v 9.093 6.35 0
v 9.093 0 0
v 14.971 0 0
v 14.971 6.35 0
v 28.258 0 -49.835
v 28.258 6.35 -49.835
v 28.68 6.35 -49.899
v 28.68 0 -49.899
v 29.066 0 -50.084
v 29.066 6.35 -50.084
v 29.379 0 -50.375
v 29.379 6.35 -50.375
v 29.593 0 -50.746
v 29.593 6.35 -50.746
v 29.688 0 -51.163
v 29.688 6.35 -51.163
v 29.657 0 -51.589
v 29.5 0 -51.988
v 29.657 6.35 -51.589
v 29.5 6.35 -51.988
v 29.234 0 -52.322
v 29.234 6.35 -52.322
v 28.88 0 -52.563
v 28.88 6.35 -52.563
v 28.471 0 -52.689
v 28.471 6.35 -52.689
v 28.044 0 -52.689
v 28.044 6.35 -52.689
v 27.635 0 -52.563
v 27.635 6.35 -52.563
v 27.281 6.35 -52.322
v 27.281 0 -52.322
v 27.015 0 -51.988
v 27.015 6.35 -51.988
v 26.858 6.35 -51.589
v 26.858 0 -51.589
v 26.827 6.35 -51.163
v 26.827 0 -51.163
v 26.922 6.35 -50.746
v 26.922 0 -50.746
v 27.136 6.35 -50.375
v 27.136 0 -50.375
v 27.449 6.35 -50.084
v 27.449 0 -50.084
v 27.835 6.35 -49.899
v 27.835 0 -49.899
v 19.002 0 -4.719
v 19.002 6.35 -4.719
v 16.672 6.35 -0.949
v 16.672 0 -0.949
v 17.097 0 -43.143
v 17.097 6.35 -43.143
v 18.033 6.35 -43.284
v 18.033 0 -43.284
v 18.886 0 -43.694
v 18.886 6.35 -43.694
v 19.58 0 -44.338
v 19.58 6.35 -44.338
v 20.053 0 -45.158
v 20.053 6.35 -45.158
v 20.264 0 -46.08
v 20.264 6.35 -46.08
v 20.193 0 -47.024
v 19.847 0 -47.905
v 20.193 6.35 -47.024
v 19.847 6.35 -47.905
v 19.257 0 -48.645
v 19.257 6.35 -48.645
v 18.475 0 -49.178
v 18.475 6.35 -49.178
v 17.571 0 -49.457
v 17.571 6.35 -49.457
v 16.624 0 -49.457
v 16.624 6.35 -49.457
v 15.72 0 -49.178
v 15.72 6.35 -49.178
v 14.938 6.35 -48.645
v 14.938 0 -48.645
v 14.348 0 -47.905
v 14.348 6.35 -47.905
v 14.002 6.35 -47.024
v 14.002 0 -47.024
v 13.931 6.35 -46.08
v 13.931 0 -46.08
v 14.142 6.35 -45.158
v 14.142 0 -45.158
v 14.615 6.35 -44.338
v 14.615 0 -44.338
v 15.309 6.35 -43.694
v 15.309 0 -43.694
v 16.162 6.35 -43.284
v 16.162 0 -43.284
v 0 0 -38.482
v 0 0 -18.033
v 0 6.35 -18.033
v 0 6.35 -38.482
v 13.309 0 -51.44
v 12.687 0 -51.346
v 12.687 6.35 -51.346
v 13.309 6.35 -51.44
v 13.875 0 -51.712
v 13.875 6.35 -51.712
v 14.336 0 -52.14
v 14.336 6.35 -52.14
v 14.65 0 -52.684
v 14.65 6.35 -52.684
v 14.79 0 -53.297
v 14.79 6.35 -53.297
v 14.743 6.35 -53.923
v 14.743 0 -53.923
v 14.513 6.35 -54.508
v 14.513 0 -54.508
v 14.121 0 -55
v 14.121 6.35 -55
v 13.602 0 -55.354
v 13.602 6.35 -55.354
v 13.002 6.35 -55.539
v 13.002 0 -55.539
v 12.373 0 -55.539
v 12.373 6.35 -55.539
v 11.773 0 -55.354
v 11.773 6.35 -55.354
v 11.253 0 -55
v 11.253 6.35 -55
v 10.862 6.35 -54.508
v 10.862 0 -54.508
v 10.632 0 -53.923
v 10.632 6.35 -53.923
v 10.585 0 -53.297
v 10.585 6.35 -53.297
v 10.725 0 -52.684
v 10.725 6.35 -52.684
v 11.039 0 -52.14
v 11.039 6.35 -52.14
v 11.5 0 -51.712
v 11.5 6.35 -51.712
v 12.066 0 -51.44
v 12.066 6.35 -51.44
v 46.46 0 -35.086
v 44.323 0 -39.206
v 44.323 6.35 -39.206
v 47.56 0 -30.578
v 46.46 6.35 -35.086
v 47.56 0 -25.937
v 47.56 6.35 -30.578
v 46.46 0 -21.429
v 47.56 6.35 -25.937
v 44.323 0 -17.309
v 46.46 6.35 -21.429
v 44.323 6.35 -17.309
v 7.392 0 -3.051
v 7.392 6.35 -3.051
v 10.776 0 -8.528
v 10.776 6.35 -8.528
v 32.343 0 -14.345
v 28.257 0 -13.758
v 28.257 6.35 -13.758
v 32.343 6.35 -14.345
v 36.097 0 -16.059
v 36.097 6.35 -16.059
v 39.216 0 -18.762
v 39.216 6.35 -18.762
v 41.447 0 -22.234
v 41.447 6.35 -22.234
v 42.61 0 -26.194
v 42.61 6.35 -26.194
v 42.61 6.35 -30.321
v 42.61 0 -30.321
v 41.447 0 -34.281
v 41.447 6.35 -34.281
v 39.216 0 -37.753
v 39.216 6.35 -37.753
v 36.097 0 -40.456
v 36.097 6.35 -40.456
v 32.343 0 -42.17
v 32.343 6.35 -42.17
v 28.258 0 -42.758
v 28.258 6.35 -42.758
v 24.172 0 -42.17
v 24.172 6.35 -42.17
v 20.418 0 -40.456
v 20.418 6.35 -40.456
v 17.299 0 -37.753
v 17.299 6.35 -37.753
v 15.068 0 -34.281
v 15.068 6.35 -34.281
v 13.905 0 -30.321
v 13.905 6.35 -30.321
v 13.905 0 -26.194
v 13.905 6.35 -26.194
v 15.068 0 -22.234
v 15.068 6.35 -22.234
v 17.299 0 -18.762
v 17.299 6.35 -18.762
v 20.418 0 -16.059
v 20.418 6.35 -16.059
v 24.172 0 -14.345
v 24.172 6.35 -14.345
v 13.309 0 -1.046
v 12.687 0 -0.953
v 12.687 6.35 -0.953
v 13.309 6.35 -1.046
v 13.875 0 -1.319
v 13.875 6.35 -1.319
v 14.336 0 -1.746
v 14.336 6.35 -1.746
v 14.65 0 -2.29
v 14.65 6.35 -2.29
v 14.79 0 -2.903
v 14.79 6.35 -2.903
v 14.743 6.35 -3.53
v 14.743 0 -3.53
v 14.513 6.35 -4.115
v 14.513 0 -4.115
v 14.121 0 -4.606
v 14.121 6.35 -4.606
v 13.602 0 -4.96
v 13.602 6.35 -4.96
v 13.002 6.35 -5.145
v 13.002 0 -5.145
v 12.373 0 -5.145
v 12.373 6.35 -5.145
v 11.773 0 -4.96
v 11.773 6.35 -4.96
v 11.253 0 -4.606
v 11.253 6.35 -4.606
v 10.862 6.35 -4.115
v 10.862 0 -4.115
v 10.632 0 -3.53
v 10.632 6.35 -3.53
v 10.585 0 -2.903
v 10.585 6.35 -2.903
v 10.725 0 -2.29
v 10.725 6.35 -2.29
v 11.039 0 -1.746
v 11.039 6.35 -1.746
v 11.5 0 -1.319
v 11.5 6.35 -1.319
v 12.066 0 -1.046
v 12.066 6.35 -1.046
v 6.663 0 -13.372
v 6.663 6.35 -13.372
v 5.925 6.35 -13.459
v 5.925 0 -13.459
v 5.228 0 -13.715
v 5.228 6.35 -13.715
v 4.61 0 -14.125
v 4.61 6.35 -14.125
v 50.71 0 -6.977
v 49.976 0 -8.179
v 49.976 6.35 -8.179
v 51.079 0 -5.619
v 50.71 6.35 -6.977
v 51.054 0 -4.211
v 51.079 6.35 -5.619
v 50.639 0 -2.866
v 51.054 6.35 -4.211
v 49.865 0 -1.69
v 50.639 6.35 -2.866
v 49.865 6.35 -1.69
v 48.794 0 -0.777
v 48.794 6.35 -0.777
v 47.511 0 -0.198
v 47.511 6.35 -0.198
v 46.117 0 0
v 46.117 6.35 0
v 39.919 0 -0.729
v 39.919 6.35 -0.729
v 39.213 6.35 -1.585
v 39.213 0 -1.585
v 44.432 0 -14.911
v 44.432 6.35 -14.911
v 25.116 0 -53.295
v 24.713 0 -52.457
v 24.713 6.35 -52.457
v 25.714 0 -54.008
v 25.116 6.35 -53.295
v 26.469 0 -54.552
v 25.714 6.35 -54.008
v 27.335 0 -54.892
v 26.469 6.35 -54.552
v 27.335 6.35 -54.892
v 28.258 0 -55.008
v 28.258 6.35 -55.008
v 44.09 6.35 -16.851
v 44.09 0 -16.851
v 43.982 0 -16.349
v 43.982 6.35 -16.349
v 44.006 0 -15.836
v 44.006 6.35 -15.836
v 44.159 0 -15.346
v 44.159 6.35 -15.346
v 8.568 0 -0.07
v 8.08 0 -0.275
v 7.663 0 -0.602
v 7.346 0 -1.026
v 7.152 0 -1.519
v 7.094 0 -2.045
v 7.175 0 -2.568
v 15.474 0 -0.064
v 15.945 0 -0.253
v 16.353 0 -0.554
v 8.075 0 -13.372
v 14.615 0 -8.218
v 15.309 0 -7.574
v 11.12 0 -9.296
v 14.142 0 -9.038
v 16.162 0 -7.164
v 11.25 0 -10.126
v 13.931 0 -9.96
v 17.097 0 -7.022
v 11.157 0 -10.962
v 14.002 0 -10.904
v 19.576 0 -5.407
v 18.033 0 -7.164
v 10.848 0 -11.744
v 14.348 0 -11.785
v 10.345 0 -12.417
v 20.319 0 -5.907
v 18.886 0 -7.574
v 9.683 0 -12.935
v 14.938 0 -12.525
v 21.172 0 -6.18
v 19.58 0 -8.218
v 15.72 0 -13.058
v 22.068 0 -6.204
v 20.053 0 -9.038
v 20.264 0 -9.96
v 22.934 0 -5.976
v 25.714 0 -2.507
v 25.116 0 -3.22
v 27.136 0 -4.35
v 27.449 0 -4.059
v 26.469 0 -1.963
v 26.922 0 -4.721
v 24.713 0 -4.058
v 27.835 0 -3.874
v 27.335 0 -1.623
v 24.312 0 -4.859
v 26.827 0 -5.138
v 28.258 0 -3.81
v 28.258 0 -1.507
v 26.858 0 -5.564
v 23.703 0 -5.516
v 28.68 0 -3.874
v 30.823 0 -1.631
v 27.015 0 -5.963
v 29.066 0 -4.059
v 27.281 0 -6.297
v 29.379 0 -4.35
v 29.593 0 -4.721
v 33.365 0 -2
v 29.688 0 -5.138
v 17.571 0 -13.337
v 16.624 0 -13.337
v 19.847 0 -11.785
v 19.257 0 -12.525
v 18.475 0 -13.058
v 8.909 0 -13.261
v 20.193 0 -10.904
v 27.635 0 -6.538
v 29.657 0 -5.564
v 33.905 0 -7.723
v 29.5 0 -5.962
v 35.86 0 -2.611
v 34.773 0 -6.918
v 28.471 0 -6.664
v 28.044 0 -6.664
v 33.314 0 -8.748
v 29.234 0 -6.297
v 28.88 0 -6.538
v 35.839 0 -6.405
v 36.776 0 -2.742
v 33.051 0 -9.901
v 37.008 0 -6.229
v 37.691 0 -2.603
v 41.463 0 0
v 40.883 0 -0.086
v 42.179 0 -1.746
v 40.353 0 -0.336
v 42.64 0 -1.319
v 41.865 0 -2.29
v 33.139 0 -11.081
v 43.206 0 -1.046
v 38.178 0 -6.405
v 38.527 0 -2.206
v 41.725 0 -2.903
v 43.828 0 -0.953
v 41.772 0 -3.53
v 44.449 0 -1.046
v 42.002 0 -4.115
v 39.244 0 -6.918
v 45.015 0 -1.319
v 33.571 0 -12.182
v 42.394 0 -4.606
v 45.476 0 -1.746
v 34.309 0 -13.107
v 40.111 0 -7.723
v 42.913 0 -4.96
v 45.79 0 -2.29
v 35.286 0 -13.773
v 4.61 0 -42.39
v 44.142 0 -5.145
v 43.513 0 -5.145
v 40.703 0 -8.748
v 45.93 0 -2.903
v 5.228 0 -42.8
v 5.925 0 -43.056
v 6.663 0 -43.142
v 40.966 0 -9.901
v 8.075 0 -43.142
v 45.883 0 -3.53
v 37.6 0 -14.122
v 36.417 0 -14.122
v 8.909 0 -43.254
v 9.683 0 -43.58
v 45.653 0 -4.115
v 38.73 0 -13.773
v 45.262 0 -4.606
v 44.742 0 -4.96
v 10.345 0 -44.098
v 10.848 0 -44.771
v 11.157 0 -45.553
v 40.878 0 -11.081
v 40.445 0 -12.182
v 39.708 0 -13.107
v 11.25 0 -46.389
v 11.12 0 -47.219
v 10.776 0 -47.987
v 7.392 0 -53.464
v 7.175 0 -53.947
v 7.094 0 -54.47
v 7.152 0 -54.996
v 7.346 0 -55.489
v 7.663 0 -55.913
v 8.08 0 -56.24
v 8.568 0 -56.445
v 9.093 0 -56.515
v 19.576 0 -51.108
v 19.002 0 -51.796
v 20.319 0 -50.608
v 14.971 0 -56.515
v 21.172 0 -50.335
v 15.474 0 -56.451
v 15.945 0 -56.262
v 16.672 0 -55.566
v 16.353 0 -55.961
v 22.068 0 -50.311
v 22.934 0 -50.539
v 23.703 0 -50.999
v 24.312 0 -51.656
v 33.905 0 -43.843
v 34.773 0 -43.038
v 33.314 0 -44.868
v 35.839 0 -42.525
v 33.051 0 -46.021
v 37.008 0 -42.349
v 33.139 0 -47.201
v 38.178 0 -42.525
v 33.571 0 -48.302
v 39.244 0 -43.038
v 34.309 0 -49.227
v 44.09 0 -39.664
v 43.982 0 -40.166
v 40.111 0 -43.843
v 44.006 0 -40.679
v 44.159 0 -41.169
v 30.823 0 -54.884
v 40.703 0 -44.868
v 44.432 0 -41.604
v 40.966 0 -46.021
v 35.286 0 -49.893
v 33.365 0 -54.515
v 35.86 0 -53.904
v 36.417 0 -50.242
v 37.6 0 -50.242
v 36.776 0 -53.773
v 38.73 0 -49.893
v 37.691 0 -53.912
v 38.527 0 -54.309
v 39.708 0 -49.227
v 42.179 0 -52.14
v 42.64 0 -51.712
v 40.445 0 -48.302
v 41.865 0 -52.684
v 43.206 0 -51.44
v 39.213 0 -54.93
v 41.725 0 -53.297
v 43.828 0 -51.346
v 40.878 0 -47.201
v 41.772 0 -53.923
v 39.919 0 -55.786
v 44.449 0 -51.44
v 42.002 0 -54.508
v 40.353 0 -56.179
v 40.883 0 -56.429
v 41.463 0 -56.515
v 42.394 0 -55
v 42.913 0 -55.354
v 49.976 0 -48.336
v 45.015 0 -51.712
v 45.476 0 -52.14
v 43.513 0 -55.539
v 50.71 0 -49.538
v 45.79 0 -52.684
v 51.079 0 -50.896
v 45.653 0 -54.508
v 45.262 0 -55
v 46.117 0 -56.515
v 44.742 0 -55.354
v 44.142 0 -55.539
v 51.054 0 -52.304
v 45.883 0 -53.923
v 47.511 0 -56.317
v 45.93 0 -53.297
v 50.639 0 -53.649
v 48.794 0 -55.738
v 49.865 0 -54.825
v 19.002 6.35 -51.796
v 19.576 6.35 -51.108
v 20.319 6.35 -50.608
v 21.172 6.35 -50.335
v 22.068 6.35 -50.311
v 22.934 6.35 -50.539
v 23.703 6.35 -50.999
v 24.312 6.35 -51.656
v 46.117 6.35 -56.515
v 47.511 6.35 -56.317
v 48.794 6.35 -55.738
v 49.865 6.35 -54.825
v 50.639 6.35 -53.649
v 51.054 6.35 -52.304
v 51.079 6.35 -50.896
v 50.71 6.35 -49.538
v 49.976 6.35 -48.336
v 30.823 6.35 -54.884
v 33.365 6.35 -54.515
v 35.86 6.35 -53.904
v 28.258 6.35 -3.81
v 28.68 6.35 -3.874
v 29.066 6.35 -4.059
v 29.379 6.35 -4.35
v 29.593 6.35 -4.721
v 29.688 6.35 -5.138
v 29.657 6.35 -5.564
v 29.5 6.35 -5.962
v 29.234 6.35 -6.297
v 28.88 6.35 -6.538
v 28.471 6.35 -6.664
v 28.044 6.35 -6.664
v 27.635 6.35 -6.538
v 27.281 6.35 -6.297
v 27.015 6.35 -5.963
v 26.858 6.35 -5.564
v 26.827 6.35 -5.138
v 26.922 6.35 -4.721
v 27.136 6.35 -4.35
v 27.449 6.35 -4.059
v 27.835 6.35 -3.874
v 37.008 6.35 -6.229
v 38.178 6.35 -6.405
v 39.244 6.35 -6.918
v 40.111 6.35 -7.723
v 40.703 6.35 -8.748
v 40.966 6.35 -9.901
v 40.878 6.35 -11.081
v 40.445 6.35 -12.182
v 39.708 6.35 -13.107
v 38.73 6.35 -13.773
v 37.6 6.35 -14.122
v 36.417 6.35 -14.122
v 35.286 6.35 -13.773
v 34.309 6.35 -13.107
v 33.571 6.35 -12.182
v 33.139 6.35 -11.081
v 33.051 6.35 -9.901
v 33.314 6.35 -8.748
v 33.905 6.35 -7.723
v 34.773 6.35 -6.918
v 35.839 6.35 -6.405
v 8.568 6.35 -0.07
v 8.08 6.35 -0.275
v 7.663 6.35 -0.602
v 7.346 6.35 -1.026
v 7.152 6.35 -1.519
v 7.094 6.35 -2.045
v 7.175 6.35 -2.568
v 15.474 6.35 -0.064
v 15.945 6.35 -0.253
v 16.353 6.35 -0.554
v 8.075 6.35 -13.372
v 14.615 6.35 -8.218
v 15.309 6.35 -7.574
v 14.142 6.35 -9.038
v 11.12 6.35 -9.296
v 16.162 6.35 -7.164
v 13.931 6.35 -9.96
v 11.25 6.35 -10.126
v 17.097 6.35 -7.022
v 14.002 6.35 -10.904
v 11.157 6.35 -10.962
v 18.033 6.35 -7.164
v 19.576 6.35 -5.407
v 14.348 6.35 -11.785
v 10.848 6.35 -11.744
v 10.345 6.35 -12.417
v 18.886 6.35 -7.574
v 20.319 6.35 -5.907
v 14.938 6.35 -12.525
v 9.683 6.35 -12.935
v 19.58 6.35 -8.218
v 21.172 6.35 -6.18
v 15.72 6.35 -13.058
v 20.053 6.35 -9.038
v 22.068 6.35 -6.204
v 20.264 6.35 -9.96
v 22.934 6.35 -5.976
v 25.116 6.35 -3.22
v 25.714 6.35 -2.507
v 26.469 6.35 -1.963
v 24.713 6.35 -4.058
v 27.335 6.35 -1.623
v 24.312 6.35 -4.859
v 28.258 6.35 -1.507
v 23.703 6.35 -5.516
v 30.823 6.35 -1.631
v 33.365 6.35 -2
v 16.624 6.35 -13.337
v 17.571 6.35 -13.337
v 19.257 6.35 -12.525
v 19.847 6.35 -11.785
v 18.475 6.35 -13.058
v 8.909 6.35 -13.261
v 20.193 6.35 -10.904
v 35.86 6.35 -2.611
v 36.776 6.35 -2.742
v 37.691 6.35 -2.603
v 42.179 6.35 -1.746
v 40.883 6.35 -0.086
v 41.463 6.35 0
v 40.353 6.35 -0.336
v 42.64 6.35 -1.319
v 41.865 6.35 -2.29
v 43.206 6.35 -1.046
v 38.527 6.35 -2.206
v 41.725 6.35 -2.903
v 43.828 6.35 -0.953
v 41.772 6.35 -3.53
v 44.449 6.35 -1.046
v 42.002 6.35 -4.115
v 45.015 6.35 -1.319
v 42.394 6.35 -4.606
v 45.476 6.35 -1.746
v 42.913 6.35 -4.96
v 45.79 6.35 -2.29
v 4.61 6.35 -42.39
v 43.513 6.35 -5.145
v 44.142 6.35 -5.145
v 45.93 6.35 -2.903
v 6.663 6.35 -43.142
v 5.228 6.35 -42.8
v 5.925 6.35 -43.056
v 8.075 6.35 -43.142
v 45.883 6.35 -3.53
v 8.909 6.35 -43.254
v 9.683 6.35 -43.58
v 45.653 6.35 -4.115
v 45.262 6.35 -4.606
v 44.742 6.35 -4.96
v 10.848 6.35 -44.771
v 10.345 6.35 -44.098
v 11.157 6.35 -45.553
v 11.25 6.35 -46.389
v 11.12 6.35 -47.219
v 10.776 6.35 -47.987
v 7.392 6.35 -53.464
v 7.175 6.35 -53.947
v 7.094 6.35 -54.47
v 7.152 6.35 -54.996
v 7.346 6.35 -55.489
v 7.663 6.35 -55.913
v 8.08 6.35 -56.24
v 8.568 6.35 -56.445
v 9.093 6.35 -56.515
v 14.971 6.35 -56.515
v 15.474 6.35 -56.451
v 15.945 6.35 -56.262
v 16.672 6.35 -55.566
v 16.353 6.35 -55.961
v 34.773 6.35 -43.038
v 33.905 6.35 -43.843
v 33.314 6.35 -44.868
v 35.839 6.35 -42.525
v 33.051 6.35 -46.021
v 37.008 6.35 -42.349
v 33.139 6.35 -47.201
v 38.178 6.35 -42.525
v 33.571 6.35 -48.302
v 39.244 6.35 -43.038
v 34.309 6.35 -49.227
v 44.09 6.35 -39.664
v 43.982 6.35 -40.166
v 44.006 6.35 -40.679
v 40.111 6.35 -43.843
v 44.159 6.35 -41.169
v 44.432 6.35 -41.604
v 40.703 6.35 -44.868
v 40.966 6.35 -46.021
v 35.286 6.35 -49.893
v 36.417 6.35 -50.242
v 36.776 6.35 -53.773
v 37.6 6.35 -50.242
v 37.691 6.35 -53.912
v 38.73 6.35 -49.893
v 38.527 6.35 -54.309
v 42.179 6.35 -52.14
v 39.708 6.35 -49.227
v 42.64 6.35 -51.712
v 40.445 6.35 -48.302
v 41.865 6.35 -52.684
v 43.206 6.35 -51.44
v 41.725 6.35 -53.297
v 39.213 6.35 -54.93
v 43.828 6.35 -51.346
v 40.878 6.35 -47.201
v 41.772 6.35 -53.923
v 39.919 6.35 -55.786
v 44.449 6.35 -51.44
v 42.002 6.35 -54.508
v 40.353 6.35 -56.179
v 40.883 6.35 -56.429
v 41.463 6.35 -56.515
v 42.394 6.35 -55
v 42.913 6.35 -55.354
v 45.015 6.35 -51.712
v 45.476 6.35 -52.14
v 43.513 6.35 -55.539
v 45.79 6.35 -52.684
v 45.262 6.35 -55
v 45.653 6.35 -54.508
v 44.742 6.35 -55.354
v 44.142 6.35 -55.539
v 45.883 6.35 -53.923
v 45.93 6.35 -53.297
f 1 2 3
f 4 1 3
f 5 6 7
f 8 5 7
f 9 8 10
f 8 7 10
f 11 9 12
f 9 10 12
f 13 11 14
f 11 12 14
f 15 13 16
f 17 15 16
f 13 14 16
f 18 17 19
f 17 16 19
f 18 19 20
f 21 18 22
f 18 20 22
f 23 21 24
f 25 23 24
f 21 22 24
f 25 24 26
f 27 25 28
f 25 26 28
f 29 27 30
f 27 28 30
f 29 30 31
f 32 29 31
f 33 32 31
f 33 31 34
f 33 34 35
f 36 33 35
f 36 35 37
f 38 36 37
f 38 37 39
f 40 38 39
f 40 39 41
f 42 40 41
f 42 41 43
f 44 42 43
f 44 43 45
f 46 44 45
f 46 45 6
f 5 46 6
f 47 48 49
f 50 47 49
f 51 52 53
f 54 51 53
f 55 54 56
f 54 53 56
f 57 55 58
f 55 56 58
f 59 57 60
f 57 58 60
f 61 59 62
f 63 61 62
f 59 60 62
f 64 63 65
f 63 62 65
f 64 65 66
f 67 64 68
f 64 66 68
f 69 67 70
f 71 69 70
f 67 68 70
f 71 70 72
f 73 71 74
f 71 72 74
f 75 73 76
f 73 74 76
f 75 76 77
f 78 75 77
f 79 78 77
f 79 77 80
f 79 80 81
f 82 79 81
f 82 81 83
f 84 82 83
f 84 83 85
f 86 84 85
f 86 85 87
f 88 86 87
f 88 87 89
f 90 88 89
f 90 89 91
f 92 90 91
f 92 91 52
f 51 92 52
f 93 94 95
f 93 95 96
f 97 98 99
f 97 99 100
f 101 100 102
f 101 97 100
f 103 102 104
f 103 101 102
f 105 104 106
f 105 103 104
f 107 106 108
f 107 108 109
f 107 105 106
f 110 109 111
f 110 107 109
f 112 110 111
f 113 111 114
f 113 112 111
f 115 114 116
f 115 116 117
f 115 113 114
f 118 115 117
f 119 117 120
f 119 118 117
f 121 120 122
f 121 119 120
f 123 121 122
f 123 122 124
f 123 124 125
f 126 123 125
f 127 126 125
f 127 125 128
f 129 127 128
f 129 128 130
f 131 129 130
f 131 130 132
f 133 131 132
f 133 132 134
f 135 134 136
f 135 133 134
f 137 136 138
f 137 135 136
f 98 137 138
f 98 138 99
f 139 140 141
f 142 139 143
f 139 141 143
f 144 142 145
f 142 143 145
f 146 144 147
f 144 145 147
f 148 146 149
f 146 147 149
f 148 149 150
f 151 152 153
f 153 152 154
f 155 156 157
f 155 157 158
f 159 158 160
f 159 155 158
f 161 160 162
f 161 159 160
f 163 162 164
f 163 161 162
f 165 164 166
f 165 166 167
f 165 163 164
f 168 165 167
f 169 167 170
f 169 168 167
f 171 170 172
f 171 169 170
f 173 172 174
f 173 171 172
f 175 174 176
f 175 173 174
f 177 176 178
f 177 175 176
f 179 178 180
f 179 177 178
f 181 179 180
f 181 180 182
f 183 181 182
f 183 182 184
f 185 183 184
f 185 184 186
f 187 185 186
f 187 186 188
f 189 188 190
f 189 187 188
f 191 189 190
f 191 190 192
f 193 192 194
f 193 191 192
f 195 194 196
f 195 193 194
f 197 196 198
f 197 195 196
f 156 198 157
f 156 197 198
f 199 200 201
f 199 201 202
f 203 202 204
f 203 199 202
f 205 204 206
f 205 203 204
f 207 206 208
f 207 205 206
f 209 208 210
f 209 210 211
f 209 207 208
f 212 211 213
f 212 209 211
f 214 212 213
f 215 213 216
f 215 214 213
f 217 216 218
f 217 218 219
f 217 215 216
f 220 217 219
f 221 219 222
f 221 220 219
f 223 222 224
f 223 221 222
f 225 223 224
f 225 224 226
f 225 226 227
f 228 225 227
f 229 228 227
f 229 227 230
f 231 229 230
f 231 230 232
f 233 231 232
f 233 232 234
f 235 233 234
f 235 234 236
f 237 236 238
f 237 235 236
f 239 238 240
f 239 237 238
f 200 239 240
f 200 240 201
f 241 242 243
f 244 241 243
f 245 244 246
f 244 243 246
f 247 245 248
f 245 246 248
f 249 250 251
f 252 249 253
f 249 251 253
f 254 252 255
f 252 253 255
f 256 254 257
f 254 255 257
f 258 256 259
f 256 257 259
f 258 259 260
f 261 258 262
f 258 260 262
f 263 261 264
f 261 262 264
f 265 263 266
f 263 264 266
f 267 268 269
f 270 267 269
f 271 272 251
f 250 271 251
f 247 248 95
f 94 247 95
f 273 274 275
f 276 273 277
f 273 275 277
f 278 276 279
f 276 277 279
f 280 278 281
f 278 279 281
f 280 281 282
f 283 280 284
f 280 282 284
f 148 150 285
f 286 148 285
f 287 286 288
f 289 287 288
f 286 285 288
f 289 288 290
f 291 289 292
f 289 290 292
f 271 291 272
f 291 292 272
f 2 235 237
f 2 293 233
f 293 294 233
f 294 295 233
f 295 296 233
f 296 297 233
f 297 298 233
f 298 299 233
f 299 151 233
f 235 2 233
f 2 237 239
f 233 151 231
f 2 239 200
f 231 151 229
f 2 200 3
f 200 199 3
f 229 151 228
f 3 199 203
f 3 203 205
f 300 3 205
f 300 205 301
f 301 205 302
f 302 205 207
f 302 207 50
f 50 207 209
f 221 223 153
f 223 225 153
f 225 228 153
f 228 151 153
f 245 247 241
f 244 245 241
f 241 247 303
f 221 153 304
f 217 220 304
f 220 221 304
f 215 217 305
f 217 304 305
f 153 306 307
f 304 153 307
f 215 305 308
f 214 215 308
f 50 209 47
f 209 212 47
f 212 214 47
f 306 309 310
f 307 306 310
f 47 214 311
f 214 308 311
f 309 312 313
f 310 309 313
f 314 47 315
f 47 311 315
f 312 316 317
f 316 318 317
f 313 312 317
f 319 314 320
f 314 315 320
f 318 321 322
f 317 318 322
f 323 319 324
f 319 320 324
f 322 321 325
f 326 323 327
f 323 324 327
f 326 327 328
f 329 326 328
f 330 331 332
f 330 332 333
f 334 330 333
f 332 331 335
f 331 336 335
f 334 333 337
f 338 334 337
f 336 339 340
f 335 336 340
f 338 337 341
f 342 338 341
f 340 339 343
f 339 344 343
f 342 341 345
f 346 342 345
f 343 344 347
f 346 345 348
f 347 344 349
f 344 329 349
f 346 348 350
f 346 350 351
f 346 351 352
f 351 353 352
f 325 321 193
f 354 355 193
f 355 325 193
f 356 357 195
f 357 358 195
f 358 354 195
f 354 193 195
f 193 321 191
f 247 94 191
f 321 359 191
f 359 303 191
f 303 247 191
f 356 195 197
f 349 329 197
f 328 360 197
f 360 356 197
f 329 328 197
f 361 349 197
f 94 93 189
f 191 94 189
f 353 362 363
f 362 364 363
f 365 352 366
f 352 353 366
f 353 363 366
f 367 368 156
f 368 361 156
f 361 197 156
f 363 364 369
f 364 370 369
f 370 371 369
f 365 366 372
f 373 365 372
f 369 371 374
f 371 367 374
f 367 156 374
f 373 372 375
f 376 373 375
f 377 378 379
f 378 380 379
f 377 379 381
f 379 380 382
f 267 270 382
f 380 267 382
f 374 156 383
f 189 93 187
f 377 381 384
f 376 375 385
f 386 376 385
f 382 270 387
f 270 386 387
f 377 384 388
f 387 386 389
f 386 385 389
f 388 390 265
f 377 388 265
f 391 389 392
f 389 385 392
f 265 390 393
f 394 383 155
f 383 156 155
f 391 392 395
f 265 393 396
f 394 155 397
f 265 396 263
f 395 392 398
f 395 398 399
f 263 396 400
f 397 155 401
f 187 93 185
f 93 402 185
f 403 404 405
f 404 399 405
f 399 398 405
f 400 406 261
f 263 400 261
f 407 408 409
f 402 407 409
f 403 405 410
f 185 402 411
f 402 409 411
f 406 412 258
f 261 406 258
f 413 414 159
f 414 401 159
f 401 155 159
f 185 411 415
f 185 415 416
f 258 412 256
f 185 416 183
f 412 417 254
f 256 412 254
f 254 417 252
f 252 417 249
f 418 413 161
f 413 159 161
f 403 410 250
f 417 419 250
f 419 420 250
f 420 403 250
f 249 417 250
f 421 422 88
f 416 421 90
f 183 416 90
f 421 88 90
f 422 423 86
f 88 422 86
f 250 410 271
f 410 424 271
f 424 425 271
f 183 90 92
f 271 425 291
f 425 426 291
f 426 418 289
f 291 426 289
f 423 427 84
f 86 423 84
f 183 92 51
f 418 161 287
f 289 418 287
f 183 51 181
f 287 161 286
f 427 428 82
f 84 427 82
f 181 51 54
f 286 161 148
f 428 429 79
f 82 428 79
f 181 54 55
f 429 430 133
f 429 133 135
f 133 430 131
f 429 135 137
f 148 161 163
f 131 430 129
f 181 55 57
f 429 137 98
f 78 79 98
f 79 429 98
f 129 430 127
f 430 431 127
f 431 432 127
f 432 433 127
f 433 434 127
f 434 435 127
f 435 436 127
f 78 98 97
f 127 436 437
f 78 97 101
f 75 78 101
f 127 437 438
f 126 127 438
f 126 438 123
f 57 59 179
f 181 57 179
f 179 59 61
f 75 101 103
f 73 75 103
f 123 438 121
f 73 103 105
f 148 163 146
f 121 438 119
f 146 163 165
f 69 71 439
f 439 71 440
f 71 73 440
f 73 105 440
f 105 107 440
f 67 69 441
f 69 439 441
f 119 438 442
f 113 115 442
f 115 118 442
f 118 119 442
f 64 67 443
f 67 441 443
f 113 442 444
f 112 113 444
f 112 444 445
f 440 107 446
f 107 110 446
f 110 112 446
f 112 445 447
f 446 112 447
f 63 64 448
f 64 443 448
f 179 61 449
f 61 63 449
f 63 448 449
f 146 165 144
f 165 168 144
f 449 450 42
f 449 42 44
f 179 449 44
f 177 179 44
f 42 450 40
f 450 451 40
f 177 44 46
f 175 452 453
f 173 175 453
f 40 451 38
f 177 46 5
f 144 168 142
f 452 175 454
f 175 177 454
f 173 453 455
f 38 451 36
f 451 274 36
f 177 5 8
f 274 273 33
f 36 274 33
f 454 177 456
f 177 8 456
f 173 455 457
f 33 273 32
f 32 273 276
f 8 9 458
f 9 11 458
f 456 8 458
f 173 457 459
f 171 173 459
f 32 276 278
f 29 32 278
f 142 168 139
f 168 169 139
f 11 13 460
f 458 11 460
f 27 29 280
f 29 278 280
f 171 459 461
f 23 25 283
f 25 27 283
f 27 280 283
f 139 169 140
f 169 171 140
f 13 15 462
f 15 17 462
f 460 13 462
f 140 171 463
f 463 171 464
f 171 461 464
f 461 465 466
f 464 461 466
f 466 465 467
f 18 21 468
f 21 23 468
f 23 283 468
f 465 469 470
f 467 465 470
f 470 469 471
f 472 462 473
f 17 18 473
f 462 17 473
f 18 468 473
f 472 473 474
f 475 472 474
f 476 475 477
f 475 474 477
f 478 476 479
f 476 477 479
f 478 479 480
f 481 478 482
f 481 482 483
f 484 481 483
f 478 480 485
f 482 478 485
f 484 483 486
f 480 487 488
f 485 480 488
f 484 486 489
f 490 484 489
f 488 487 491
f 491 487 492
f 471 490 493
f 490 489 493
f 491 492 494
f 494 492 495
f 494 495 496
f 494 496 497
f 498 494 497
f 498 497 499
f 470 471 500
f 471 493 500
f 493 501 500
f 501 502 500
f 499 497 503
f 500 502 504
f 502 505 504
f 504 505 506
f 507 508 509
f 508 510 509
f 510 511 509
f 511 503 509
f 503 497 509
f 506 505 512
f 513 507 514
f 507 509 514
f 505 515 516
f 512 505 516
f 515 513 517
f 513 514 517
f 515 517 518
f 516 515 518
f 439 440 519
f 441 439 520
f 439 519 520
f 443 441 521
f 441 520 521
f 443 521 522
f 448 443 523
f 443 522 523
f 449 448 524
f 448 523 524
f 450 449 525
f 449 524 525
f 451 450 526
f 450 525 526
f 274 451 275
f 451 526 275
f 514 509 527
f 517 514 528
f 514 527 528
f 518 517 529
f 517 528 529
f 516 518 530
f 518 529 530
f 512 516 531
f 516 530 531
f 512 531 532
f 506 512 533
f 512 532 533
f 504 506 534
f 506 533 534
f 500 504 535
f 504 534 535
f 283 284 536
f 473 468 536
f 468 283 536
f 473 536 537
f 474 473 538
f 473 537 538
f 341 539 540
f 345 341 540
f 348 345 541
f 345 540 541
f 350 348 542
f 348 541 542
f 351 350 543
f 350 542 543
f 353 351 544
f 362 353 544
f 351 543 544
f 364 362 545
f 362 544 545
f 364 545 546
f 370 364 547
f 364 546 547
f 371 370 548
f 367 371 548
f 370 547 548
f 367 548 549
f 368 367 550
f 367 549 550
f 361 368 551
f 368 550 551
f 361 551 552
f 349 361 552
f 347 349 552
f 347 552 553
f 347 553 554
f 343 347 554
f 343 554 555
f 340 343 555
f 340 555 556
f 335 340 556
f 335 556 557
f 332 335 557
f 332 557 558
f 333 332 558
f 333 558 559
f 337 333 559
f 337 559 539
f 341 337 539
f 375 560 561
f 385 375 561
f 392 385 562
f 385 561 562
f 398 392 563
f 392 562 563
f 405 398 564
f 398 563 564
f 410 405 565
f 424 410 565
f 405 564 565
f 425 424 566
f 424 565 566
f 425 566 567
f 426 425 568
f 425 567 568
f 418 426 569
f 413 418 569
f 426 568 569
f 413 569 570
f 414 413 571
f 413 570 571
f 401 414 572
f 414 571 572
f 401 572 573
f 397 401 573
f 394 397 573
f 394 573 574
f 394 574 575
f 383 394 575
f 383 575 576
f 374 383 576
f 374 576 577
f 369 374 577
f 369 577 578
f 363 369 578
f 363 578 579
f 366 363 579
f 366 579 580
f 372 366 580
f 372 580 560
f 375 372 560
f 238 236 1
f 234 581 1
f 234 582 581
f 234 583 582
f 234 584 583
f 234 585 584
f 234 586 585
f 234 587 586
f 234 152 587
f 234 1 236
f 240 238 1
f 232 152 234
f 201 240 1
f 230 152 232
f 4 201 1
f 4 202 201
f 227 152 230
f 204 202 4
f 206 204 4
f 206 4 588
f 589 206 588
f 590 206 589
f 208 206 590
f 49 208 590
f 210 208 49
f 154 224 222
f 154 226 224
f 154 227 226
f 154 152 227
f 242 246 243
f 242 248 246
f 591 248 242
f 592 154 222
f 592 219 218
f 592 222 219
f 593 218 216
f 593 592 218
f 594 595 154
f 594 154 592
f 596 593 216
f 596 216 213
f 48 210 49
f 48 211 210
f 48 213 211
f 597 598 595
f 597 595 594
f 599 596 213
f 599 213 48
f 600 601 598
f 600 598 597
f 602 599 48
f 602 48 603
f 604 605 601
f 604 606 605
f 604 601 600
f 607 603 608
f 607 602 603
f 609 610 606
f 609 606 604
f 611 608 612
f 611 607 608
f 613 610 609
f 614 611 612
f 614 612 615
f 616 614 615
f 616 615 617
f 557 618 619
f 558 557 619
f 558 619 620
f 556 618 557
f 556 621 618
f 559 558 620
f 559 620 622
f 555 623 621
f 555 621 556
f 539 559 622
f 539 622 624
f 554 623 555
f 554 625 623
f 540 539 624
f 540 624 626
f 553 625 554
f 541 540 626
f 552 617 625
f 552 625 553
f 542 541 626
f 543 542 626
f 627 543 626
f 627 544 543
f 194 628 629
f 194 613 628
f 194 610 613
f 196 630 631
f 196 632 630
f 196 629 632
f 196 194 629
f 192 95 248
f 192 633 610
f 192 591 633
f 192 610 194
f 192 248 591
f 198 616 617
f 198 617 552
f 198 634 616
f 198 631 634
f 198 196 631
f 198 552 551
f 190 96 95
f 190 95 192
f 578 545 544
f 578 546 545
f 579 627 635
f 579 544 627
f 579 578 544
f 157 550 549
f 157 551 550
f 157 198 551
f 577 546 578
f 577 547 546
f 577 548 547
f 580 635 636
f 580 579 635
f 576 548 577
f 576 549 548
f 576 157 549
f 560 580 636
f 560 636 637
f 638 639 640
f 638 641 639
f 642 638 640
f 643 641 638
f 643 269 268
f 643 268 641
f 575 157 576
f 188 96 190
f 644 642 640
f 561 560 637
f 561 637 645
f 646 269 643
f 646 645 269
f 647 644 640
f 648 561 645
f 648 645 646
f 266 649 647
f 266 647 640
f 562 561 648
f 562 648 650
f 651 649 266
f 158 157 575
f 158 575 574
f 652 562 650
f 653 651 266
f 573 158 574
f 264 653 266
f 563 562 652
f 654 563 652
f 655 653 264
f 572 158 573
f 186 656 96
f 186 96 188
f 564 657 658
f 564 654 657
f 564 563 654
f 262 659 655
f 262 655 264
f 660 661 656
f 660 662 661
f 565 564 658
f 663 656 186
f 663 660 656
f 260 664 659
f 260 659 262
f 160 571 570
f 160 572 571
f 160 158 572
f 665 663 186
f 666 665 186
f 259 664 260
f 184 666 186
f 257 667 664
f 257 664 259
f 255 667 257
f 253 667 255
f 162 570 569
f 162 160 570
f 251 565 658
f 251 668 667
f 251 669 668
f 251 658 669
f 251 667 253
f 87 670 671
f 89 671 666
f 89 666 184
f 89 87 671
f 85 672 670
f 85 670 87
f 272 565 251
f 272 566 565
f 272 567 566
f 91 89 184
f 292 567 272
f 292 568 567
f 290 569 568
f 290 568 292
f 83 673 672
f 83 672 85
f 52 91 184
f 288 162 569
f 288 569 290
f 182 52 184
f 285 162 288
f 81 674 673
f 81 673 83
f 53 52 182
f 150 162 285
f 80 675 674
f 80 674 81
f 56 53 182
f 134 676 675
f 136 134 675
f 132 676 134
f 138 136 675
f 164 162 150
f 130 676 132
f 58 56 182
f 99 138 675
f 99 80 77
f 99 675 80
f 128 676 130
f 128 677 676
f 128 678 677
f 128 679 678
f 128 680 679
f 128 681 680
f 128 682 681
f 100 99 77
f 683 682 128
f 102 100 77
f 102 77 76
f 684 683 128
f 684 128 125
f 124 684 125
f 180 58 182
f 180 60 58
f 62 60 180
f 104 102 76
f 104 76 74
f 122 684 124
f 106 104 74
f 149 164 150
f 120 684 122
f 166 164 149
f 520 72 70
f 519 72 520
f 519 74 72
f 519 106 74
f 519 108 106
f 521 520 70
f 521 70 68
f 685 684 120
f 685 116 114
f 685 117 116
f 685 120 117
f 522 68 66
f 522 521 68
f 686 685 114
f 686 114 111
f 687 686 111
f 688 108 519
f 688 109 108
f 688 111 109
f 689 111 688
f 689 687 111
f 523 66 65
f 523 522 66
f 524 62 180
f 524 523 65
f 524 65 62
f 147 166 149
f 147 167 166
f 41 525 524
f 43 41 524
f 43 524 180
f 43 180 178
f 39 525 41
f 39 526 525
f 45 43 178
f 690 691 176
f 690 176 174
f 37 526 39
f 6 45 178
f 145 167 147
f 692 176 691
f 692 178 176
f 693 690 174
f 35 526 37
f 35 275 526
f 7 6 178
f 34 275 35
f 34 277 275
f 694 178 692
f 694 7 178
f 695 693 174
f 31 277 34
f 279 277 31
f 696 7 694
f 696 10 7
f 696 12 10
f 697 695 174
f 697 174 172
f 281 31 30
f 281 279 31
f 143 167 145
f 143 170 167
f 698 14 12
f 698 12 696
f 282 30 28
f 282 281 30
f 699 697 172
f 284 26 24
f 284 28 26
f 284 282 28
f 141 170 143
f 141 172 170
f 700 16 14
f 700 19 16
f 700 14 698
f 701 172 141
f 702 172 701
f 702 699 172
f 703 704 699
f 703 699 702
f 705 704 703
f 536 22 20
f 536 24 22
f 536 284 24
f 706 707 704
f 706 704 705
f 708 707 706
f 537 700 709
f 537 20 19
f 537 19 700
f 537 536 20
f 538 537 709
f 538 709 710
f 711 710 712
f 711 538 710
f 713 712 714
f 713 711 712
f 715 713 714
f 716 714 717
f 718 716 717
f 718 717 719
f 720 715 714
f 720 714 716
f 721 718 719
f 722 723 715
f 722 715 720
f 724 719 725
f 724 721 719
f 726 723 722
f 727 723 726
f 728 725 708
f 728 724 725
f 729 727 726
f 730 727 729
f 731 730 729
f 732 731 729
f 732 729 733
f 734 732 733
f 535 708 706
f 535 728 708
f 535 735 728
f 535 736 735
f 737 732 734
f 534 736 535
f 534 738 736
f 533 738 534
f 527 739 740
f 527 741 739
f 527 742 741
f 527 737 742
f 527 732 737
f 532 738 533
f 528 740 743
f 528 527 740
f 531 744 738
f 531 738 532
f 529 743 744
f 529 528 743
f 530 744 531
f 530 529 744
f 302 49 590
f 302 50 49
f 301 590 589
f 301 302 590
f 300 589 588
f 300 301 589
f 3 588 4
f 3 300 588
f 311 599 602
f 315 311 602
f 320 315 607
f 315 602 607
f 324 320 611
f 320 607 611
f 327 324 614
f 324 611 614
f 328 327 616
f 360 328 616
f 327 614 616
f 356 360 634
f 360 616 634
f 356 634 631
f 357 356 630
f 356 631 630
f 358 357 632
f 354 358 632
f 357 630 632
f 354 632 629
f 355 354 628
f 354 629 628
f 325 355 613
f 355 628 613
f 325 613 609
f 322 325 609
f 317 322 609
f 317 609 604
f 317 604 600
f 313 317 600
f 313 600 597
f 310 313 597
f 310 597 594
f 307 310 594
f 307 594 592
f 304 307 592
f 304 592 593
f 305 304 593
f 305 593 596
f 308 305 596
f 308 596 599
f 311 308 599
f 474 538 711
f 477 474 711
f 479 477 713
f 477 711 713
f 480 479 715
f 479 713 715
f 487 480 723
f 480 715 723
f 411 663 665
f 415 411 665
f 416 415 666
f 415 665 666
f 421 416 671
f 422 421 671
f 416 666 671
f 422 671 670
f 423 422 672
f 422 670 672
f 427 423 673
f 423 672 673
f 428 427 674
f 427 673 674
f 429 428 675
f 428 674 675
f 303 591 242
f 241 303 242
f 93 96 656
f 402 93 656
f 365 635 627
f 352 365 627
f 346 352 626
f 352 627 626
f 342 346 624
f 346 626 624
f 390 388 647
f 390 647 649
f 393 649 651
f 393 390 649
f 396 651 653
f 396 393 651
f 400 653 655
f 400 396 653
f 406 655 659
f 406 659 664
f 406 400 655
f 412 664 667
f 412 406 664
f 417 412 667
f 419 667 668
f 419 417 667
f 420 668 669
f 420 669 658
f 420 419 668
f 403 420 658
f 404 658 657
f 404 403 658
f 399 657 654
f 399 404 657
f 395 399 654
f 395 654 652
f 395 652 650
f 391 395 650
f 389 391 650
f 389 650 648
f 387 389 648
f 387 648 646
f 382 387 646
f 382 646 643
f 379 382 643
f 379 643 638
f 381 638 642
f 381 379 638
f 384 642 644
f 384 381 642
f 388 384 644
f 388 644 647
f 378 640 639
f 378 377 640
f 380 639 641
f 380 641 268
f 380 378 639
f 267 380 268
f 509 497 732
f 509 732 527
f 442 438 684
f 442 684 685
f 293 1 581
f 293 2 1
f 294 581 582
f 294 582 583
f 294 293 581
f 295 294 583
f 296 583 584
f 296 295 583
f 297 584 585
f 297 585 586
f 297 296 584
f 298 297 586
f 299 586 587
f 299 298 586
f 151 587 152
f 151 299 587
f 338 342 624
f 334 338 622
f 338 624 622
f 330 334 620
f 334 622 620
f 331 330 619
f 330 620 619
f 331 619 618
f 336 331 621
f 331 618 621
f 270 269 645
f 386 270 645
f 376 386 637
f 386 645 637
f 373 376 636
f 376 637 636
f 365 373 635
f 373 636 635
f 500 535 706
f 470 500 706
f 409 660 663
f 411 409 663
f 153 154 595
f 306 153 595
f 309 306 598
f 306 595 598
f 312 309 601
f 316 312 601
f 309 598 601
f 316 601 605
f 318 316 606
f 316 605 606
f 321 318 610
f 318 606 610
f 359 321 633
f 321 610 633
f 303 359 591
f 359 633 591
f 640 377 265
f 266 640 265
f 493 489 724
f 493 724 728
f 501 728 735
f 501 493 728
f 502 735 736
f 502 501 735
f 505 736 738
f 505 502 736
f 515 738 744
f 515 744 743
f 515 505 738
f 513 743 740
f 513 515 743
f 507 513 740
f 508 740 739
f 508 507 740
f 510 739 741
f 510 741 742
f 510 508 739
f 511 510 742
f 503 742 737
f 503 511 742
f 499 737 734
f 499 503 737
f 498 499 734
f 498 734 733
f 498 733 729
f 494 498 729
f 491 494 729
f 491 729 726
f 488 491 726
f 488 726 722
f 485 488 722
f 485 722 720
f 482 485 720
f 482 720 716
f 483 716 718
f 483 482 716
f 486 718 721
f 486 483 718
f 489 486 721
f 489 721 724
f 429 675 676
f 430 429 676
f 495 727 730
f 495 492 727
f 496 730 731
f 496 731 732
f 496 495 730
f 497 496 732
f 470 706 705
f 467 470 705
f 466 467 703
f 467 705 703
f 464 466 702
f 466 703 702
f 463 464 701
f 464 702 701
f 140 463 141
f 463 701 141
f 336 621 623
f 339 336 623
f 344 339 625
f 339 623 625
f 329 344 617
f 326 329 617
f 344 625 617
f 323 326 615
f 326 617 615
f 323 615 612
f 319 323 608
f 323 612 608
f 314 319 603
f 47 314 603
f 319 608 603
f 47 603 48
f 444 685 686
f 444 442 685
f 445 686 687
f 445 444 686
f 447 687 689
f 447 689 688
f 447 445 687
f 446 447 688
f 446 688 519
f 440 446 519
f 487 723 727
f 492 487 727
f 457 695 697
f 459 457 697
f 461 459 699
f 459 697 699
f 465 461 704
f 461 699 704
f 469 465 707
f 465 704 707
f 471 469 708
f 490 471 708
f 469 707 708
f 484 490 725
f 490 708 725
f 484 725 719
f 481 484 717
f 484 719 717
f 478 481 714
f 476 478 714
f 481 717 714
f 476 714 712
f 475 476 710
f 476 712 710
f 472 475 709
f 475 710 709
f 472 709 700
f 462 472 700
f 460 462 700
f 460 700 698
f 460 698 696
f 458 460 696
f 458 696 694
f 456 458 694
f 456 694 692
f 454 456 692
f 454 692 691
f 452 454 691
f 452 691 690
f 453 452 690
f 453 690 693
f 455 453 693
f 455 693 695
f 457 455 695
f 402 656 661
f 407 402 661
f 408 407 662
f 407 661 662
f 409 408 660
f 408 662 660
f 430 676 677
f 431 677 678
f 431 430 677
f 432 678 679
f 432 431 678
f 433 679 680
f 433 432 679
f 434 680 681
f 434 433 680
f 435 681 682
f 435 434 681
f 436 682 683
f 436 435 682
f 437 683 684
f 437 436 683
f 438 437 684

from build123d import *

# Parameters (mm, degrees)
SKETCH1_W           = 56.515
SKETCH1_H           = 56.515
SKETCH1_R           = 2.1082
SKETCH1_R_2         = 14.5
BOSS_EXTRUDE1_DEPTH = 6.35
SKETCH3_R           = 1.435
SKETCH3_R_2         = 3.96875
SKETCH3_R_3         = 3.175
CUT_EXTRUDE1_DEPTH  = 81.176137036
FILLET1_R           = 2


with BuildPart() as part:
    # Sketch1 → Boss-Extrude1 (new body)
    with BuildSketch(Plane(origin=(0, 0, 0), x_dir=(1, 0, 0), z_dir=(0, 1, 0))):
        with Locations((28.2575, 28.2575)):
            Rectangle(SKETCH1_W, SKETCH1_H)
        with Locations(Location((43.8277, 3.0607, 0), (0, 0, 270))):
            Circle(SKETCH1_R, mode=Mode.SUBTRACT)
        with Locations(Location((12.6873, 3.0607, 0), (0, 0, 270))):
            Circle(SKETCH1_R, mode=Mode.SUBTRACT)
        with Locations(Location((12.6873, 53.4543, 0), (0, 0, 270))):
            Circle(SKETCH1_R, mode=Mode.SUBTRACT)
        with Locations(Location((43.8277, 53.4543, 0), (0, 0, 270))):
            Circle(SKETCH1_R, mode=Mode.SUBTRACT)
        with Locations(Location((28.2575, 28.2575, 0), (0, 0, 270))):
            Circle(SKETCH1_R_2, mode=Mode.SUBTRACT)
    extrude(amount=BOSS_EXTRUDE1_DEPTH)

    # Sketch3 → Cut-Extrude1 (cut, through all)
    with BuildSketch(Plane(origin=(0, 6.35, 0), x_dir=(1, 0, 0), z_dir=(0, 1, 0))):
        with BuildLine():
            Line((16.085813501, 0), (40.518749208, 0))
            Line((40.518749208, 0), (39.213305633, 1.585036242))
            ThreePointArc((39.213305633, 1.585036242), (37.691149508, 2.60271564), (35.860147574, 2.610623974))
            ThreePointArc((35.860147574, 2.610623974), (32.098630453, 1.784717433), (28.2575, 1.5075))
            ThreePointArc((28.2575, 1.5075), (26.074260862, 2.211458651), (24.713448522, 4.058153181))
            ThreePointArc((24.713448522, 4.058153181), (22.067676274, 6.203891014), (19.001857165, 4.718948313))
            Line((19.001857165, 4.718948313), (16.085813501, 0))
        make_face()
        with BuildLine():
            ThreePointArc((49.976496805, 8.178709811), (50.638799533, 2.866171171), (46.116988554, 0))
            Line((46.116988554, 0), (56.515, 0))
            Line((56.515, 0), (56.515, 56.515))
            Line((56.515, 56.515), (46.116988554, 56.515))
            ThreePointArc((46.116988554, 56.515), (50.638799533, 53.648828829), (49.976496805, 48.336290189))
            Line((49.976496805, 48.336290189), (44.431541374, 41.603746953))
            ThreePointArc((44.431541374, 41.603746953), (43.977403924, 40.422997575), (44.322647522, 39.20594508))
            ThreePointArc((44.322647522, 39.20594508), (47.698626885, 28.2575), (44.322647522, 17.30905492))
            ThreePointArc((44.322647522, 17.30905492), (43.977403924, 16.092002425), (44.431541374, 14.911253047))
            Line((44.431541374, 14.911253047), (49.976496805, 8.178709811))
        make_face()
        with BuildLine():
            Line((0, 0), (5.506106862, 0))
            Line((5.506106862, 0), (10.776226353, 8.52848048))
            ThreePointArc((10.776226353, 8.52848048), (10.848364266, 11.743703095), (8.0753008, 13.3725))
            Line((8.0753008, 13.3725), (6.662712379, 13.3725))
            ThreePointArc((6.662712379, 13.3725), (5.569380258, 13.566686374), (4.609786847, 14.125492205))
            Line((4.609786847, 14.125492205), (0, 18.032807917))
            Line((0, 18.032807917), (0, 0))
        make_face()
        with BuildLine():
            Line((39.213305633, 54.929963758), (40.518749208, 56.515))
            Line((40.518749208, 56.515), (16.085813501, 56.515))
            Line((16.085813501, 56.515), (19.001857165, 51.796051687))
            ThreePointArc((19.001857165, 51.796051687), (22.067676274, 50.311108986), (24.713448522, 52.456846819))
            ThreePointArc((24.713448522, 52.456846819), (26.074260862, 54.303541349), (28.2575, 55.0075))
            ThreePointArc((28.2575, 55.0075), (32.098630453, 54.730282567), (35.860147574, 53.904376026))
            ThreePointArc((35.860147574, 53.904376026), (37.691149508, 53.91228436), (39.213305633, 54.929963758))
        make_face()
        with BuildLine():
            Line((10.776226353, 47.98651952), (5.506106862, 56.515))
            Line((5.506106862, 56.515), (0, 56.515))
            Line((0, 56.515), (0, 38.482192083))
            Line((0, 38.482192083), (4.609786847, 42.389507795))
            ThreePointArc((4.609786847, 42.389507795), (5.569380258, 42.948313626), (6.662712379, 43.1425))
            Line((6.662712379, 43.1425), (8.0753008, 43.1425))
            ThreePointArc((8.0753008, 43.1425), (10.848364266, 44.771296905), (10.776226353, 47.98651952))
        make_face()
        with Locations(Location((28.2575, 51.27, 0), (0, 0, 270))):
            Circle(SKETCH3_R)
        with Locations(Location((28.2575, 5.245, 0), (0, 0, 270))):
            Circle(SKETCH3_R)
        with Locations(Location((37.008353254, 10.1975, 0), (0, 0, 270))):
            Circle(SKETCH3_R_2)
        with Locations(Location((17.097439516, 10.1975, 0), (0, 0, 270))):
            Circle(SKETCH3_R_3)
        with Locations(Location((17.097439516, 46.3175, 0), (0, 0, 270))):
            Circle(SKETCH3_R_3)
        with Locations(Location((37.008353254, 46.3175, 0), (0, 0, 270))):
            Circle(SKETCH3_R_2)
    extrude(amount=-CUT_EXTRUDE1_DEPTH, mode=Mode.SUBTRACT)

    # Fillet1
    fillet1_edges = [part.edges().sort_by_distance(p)[0] for p in [
        (40.518749208, 3.175, 0),
        (16.085813501, 3.175, 0),
        (5.506106862, 3.175, 0),
        (5.506106862, 3.175, -56.515),
        (16.085813501, 3.175, -56.515),
        (40.518749208, 3.175, -56.515),
    ]]
    fillet(fillet1_edges, radius=FILLET1_R)


solid = part.part
